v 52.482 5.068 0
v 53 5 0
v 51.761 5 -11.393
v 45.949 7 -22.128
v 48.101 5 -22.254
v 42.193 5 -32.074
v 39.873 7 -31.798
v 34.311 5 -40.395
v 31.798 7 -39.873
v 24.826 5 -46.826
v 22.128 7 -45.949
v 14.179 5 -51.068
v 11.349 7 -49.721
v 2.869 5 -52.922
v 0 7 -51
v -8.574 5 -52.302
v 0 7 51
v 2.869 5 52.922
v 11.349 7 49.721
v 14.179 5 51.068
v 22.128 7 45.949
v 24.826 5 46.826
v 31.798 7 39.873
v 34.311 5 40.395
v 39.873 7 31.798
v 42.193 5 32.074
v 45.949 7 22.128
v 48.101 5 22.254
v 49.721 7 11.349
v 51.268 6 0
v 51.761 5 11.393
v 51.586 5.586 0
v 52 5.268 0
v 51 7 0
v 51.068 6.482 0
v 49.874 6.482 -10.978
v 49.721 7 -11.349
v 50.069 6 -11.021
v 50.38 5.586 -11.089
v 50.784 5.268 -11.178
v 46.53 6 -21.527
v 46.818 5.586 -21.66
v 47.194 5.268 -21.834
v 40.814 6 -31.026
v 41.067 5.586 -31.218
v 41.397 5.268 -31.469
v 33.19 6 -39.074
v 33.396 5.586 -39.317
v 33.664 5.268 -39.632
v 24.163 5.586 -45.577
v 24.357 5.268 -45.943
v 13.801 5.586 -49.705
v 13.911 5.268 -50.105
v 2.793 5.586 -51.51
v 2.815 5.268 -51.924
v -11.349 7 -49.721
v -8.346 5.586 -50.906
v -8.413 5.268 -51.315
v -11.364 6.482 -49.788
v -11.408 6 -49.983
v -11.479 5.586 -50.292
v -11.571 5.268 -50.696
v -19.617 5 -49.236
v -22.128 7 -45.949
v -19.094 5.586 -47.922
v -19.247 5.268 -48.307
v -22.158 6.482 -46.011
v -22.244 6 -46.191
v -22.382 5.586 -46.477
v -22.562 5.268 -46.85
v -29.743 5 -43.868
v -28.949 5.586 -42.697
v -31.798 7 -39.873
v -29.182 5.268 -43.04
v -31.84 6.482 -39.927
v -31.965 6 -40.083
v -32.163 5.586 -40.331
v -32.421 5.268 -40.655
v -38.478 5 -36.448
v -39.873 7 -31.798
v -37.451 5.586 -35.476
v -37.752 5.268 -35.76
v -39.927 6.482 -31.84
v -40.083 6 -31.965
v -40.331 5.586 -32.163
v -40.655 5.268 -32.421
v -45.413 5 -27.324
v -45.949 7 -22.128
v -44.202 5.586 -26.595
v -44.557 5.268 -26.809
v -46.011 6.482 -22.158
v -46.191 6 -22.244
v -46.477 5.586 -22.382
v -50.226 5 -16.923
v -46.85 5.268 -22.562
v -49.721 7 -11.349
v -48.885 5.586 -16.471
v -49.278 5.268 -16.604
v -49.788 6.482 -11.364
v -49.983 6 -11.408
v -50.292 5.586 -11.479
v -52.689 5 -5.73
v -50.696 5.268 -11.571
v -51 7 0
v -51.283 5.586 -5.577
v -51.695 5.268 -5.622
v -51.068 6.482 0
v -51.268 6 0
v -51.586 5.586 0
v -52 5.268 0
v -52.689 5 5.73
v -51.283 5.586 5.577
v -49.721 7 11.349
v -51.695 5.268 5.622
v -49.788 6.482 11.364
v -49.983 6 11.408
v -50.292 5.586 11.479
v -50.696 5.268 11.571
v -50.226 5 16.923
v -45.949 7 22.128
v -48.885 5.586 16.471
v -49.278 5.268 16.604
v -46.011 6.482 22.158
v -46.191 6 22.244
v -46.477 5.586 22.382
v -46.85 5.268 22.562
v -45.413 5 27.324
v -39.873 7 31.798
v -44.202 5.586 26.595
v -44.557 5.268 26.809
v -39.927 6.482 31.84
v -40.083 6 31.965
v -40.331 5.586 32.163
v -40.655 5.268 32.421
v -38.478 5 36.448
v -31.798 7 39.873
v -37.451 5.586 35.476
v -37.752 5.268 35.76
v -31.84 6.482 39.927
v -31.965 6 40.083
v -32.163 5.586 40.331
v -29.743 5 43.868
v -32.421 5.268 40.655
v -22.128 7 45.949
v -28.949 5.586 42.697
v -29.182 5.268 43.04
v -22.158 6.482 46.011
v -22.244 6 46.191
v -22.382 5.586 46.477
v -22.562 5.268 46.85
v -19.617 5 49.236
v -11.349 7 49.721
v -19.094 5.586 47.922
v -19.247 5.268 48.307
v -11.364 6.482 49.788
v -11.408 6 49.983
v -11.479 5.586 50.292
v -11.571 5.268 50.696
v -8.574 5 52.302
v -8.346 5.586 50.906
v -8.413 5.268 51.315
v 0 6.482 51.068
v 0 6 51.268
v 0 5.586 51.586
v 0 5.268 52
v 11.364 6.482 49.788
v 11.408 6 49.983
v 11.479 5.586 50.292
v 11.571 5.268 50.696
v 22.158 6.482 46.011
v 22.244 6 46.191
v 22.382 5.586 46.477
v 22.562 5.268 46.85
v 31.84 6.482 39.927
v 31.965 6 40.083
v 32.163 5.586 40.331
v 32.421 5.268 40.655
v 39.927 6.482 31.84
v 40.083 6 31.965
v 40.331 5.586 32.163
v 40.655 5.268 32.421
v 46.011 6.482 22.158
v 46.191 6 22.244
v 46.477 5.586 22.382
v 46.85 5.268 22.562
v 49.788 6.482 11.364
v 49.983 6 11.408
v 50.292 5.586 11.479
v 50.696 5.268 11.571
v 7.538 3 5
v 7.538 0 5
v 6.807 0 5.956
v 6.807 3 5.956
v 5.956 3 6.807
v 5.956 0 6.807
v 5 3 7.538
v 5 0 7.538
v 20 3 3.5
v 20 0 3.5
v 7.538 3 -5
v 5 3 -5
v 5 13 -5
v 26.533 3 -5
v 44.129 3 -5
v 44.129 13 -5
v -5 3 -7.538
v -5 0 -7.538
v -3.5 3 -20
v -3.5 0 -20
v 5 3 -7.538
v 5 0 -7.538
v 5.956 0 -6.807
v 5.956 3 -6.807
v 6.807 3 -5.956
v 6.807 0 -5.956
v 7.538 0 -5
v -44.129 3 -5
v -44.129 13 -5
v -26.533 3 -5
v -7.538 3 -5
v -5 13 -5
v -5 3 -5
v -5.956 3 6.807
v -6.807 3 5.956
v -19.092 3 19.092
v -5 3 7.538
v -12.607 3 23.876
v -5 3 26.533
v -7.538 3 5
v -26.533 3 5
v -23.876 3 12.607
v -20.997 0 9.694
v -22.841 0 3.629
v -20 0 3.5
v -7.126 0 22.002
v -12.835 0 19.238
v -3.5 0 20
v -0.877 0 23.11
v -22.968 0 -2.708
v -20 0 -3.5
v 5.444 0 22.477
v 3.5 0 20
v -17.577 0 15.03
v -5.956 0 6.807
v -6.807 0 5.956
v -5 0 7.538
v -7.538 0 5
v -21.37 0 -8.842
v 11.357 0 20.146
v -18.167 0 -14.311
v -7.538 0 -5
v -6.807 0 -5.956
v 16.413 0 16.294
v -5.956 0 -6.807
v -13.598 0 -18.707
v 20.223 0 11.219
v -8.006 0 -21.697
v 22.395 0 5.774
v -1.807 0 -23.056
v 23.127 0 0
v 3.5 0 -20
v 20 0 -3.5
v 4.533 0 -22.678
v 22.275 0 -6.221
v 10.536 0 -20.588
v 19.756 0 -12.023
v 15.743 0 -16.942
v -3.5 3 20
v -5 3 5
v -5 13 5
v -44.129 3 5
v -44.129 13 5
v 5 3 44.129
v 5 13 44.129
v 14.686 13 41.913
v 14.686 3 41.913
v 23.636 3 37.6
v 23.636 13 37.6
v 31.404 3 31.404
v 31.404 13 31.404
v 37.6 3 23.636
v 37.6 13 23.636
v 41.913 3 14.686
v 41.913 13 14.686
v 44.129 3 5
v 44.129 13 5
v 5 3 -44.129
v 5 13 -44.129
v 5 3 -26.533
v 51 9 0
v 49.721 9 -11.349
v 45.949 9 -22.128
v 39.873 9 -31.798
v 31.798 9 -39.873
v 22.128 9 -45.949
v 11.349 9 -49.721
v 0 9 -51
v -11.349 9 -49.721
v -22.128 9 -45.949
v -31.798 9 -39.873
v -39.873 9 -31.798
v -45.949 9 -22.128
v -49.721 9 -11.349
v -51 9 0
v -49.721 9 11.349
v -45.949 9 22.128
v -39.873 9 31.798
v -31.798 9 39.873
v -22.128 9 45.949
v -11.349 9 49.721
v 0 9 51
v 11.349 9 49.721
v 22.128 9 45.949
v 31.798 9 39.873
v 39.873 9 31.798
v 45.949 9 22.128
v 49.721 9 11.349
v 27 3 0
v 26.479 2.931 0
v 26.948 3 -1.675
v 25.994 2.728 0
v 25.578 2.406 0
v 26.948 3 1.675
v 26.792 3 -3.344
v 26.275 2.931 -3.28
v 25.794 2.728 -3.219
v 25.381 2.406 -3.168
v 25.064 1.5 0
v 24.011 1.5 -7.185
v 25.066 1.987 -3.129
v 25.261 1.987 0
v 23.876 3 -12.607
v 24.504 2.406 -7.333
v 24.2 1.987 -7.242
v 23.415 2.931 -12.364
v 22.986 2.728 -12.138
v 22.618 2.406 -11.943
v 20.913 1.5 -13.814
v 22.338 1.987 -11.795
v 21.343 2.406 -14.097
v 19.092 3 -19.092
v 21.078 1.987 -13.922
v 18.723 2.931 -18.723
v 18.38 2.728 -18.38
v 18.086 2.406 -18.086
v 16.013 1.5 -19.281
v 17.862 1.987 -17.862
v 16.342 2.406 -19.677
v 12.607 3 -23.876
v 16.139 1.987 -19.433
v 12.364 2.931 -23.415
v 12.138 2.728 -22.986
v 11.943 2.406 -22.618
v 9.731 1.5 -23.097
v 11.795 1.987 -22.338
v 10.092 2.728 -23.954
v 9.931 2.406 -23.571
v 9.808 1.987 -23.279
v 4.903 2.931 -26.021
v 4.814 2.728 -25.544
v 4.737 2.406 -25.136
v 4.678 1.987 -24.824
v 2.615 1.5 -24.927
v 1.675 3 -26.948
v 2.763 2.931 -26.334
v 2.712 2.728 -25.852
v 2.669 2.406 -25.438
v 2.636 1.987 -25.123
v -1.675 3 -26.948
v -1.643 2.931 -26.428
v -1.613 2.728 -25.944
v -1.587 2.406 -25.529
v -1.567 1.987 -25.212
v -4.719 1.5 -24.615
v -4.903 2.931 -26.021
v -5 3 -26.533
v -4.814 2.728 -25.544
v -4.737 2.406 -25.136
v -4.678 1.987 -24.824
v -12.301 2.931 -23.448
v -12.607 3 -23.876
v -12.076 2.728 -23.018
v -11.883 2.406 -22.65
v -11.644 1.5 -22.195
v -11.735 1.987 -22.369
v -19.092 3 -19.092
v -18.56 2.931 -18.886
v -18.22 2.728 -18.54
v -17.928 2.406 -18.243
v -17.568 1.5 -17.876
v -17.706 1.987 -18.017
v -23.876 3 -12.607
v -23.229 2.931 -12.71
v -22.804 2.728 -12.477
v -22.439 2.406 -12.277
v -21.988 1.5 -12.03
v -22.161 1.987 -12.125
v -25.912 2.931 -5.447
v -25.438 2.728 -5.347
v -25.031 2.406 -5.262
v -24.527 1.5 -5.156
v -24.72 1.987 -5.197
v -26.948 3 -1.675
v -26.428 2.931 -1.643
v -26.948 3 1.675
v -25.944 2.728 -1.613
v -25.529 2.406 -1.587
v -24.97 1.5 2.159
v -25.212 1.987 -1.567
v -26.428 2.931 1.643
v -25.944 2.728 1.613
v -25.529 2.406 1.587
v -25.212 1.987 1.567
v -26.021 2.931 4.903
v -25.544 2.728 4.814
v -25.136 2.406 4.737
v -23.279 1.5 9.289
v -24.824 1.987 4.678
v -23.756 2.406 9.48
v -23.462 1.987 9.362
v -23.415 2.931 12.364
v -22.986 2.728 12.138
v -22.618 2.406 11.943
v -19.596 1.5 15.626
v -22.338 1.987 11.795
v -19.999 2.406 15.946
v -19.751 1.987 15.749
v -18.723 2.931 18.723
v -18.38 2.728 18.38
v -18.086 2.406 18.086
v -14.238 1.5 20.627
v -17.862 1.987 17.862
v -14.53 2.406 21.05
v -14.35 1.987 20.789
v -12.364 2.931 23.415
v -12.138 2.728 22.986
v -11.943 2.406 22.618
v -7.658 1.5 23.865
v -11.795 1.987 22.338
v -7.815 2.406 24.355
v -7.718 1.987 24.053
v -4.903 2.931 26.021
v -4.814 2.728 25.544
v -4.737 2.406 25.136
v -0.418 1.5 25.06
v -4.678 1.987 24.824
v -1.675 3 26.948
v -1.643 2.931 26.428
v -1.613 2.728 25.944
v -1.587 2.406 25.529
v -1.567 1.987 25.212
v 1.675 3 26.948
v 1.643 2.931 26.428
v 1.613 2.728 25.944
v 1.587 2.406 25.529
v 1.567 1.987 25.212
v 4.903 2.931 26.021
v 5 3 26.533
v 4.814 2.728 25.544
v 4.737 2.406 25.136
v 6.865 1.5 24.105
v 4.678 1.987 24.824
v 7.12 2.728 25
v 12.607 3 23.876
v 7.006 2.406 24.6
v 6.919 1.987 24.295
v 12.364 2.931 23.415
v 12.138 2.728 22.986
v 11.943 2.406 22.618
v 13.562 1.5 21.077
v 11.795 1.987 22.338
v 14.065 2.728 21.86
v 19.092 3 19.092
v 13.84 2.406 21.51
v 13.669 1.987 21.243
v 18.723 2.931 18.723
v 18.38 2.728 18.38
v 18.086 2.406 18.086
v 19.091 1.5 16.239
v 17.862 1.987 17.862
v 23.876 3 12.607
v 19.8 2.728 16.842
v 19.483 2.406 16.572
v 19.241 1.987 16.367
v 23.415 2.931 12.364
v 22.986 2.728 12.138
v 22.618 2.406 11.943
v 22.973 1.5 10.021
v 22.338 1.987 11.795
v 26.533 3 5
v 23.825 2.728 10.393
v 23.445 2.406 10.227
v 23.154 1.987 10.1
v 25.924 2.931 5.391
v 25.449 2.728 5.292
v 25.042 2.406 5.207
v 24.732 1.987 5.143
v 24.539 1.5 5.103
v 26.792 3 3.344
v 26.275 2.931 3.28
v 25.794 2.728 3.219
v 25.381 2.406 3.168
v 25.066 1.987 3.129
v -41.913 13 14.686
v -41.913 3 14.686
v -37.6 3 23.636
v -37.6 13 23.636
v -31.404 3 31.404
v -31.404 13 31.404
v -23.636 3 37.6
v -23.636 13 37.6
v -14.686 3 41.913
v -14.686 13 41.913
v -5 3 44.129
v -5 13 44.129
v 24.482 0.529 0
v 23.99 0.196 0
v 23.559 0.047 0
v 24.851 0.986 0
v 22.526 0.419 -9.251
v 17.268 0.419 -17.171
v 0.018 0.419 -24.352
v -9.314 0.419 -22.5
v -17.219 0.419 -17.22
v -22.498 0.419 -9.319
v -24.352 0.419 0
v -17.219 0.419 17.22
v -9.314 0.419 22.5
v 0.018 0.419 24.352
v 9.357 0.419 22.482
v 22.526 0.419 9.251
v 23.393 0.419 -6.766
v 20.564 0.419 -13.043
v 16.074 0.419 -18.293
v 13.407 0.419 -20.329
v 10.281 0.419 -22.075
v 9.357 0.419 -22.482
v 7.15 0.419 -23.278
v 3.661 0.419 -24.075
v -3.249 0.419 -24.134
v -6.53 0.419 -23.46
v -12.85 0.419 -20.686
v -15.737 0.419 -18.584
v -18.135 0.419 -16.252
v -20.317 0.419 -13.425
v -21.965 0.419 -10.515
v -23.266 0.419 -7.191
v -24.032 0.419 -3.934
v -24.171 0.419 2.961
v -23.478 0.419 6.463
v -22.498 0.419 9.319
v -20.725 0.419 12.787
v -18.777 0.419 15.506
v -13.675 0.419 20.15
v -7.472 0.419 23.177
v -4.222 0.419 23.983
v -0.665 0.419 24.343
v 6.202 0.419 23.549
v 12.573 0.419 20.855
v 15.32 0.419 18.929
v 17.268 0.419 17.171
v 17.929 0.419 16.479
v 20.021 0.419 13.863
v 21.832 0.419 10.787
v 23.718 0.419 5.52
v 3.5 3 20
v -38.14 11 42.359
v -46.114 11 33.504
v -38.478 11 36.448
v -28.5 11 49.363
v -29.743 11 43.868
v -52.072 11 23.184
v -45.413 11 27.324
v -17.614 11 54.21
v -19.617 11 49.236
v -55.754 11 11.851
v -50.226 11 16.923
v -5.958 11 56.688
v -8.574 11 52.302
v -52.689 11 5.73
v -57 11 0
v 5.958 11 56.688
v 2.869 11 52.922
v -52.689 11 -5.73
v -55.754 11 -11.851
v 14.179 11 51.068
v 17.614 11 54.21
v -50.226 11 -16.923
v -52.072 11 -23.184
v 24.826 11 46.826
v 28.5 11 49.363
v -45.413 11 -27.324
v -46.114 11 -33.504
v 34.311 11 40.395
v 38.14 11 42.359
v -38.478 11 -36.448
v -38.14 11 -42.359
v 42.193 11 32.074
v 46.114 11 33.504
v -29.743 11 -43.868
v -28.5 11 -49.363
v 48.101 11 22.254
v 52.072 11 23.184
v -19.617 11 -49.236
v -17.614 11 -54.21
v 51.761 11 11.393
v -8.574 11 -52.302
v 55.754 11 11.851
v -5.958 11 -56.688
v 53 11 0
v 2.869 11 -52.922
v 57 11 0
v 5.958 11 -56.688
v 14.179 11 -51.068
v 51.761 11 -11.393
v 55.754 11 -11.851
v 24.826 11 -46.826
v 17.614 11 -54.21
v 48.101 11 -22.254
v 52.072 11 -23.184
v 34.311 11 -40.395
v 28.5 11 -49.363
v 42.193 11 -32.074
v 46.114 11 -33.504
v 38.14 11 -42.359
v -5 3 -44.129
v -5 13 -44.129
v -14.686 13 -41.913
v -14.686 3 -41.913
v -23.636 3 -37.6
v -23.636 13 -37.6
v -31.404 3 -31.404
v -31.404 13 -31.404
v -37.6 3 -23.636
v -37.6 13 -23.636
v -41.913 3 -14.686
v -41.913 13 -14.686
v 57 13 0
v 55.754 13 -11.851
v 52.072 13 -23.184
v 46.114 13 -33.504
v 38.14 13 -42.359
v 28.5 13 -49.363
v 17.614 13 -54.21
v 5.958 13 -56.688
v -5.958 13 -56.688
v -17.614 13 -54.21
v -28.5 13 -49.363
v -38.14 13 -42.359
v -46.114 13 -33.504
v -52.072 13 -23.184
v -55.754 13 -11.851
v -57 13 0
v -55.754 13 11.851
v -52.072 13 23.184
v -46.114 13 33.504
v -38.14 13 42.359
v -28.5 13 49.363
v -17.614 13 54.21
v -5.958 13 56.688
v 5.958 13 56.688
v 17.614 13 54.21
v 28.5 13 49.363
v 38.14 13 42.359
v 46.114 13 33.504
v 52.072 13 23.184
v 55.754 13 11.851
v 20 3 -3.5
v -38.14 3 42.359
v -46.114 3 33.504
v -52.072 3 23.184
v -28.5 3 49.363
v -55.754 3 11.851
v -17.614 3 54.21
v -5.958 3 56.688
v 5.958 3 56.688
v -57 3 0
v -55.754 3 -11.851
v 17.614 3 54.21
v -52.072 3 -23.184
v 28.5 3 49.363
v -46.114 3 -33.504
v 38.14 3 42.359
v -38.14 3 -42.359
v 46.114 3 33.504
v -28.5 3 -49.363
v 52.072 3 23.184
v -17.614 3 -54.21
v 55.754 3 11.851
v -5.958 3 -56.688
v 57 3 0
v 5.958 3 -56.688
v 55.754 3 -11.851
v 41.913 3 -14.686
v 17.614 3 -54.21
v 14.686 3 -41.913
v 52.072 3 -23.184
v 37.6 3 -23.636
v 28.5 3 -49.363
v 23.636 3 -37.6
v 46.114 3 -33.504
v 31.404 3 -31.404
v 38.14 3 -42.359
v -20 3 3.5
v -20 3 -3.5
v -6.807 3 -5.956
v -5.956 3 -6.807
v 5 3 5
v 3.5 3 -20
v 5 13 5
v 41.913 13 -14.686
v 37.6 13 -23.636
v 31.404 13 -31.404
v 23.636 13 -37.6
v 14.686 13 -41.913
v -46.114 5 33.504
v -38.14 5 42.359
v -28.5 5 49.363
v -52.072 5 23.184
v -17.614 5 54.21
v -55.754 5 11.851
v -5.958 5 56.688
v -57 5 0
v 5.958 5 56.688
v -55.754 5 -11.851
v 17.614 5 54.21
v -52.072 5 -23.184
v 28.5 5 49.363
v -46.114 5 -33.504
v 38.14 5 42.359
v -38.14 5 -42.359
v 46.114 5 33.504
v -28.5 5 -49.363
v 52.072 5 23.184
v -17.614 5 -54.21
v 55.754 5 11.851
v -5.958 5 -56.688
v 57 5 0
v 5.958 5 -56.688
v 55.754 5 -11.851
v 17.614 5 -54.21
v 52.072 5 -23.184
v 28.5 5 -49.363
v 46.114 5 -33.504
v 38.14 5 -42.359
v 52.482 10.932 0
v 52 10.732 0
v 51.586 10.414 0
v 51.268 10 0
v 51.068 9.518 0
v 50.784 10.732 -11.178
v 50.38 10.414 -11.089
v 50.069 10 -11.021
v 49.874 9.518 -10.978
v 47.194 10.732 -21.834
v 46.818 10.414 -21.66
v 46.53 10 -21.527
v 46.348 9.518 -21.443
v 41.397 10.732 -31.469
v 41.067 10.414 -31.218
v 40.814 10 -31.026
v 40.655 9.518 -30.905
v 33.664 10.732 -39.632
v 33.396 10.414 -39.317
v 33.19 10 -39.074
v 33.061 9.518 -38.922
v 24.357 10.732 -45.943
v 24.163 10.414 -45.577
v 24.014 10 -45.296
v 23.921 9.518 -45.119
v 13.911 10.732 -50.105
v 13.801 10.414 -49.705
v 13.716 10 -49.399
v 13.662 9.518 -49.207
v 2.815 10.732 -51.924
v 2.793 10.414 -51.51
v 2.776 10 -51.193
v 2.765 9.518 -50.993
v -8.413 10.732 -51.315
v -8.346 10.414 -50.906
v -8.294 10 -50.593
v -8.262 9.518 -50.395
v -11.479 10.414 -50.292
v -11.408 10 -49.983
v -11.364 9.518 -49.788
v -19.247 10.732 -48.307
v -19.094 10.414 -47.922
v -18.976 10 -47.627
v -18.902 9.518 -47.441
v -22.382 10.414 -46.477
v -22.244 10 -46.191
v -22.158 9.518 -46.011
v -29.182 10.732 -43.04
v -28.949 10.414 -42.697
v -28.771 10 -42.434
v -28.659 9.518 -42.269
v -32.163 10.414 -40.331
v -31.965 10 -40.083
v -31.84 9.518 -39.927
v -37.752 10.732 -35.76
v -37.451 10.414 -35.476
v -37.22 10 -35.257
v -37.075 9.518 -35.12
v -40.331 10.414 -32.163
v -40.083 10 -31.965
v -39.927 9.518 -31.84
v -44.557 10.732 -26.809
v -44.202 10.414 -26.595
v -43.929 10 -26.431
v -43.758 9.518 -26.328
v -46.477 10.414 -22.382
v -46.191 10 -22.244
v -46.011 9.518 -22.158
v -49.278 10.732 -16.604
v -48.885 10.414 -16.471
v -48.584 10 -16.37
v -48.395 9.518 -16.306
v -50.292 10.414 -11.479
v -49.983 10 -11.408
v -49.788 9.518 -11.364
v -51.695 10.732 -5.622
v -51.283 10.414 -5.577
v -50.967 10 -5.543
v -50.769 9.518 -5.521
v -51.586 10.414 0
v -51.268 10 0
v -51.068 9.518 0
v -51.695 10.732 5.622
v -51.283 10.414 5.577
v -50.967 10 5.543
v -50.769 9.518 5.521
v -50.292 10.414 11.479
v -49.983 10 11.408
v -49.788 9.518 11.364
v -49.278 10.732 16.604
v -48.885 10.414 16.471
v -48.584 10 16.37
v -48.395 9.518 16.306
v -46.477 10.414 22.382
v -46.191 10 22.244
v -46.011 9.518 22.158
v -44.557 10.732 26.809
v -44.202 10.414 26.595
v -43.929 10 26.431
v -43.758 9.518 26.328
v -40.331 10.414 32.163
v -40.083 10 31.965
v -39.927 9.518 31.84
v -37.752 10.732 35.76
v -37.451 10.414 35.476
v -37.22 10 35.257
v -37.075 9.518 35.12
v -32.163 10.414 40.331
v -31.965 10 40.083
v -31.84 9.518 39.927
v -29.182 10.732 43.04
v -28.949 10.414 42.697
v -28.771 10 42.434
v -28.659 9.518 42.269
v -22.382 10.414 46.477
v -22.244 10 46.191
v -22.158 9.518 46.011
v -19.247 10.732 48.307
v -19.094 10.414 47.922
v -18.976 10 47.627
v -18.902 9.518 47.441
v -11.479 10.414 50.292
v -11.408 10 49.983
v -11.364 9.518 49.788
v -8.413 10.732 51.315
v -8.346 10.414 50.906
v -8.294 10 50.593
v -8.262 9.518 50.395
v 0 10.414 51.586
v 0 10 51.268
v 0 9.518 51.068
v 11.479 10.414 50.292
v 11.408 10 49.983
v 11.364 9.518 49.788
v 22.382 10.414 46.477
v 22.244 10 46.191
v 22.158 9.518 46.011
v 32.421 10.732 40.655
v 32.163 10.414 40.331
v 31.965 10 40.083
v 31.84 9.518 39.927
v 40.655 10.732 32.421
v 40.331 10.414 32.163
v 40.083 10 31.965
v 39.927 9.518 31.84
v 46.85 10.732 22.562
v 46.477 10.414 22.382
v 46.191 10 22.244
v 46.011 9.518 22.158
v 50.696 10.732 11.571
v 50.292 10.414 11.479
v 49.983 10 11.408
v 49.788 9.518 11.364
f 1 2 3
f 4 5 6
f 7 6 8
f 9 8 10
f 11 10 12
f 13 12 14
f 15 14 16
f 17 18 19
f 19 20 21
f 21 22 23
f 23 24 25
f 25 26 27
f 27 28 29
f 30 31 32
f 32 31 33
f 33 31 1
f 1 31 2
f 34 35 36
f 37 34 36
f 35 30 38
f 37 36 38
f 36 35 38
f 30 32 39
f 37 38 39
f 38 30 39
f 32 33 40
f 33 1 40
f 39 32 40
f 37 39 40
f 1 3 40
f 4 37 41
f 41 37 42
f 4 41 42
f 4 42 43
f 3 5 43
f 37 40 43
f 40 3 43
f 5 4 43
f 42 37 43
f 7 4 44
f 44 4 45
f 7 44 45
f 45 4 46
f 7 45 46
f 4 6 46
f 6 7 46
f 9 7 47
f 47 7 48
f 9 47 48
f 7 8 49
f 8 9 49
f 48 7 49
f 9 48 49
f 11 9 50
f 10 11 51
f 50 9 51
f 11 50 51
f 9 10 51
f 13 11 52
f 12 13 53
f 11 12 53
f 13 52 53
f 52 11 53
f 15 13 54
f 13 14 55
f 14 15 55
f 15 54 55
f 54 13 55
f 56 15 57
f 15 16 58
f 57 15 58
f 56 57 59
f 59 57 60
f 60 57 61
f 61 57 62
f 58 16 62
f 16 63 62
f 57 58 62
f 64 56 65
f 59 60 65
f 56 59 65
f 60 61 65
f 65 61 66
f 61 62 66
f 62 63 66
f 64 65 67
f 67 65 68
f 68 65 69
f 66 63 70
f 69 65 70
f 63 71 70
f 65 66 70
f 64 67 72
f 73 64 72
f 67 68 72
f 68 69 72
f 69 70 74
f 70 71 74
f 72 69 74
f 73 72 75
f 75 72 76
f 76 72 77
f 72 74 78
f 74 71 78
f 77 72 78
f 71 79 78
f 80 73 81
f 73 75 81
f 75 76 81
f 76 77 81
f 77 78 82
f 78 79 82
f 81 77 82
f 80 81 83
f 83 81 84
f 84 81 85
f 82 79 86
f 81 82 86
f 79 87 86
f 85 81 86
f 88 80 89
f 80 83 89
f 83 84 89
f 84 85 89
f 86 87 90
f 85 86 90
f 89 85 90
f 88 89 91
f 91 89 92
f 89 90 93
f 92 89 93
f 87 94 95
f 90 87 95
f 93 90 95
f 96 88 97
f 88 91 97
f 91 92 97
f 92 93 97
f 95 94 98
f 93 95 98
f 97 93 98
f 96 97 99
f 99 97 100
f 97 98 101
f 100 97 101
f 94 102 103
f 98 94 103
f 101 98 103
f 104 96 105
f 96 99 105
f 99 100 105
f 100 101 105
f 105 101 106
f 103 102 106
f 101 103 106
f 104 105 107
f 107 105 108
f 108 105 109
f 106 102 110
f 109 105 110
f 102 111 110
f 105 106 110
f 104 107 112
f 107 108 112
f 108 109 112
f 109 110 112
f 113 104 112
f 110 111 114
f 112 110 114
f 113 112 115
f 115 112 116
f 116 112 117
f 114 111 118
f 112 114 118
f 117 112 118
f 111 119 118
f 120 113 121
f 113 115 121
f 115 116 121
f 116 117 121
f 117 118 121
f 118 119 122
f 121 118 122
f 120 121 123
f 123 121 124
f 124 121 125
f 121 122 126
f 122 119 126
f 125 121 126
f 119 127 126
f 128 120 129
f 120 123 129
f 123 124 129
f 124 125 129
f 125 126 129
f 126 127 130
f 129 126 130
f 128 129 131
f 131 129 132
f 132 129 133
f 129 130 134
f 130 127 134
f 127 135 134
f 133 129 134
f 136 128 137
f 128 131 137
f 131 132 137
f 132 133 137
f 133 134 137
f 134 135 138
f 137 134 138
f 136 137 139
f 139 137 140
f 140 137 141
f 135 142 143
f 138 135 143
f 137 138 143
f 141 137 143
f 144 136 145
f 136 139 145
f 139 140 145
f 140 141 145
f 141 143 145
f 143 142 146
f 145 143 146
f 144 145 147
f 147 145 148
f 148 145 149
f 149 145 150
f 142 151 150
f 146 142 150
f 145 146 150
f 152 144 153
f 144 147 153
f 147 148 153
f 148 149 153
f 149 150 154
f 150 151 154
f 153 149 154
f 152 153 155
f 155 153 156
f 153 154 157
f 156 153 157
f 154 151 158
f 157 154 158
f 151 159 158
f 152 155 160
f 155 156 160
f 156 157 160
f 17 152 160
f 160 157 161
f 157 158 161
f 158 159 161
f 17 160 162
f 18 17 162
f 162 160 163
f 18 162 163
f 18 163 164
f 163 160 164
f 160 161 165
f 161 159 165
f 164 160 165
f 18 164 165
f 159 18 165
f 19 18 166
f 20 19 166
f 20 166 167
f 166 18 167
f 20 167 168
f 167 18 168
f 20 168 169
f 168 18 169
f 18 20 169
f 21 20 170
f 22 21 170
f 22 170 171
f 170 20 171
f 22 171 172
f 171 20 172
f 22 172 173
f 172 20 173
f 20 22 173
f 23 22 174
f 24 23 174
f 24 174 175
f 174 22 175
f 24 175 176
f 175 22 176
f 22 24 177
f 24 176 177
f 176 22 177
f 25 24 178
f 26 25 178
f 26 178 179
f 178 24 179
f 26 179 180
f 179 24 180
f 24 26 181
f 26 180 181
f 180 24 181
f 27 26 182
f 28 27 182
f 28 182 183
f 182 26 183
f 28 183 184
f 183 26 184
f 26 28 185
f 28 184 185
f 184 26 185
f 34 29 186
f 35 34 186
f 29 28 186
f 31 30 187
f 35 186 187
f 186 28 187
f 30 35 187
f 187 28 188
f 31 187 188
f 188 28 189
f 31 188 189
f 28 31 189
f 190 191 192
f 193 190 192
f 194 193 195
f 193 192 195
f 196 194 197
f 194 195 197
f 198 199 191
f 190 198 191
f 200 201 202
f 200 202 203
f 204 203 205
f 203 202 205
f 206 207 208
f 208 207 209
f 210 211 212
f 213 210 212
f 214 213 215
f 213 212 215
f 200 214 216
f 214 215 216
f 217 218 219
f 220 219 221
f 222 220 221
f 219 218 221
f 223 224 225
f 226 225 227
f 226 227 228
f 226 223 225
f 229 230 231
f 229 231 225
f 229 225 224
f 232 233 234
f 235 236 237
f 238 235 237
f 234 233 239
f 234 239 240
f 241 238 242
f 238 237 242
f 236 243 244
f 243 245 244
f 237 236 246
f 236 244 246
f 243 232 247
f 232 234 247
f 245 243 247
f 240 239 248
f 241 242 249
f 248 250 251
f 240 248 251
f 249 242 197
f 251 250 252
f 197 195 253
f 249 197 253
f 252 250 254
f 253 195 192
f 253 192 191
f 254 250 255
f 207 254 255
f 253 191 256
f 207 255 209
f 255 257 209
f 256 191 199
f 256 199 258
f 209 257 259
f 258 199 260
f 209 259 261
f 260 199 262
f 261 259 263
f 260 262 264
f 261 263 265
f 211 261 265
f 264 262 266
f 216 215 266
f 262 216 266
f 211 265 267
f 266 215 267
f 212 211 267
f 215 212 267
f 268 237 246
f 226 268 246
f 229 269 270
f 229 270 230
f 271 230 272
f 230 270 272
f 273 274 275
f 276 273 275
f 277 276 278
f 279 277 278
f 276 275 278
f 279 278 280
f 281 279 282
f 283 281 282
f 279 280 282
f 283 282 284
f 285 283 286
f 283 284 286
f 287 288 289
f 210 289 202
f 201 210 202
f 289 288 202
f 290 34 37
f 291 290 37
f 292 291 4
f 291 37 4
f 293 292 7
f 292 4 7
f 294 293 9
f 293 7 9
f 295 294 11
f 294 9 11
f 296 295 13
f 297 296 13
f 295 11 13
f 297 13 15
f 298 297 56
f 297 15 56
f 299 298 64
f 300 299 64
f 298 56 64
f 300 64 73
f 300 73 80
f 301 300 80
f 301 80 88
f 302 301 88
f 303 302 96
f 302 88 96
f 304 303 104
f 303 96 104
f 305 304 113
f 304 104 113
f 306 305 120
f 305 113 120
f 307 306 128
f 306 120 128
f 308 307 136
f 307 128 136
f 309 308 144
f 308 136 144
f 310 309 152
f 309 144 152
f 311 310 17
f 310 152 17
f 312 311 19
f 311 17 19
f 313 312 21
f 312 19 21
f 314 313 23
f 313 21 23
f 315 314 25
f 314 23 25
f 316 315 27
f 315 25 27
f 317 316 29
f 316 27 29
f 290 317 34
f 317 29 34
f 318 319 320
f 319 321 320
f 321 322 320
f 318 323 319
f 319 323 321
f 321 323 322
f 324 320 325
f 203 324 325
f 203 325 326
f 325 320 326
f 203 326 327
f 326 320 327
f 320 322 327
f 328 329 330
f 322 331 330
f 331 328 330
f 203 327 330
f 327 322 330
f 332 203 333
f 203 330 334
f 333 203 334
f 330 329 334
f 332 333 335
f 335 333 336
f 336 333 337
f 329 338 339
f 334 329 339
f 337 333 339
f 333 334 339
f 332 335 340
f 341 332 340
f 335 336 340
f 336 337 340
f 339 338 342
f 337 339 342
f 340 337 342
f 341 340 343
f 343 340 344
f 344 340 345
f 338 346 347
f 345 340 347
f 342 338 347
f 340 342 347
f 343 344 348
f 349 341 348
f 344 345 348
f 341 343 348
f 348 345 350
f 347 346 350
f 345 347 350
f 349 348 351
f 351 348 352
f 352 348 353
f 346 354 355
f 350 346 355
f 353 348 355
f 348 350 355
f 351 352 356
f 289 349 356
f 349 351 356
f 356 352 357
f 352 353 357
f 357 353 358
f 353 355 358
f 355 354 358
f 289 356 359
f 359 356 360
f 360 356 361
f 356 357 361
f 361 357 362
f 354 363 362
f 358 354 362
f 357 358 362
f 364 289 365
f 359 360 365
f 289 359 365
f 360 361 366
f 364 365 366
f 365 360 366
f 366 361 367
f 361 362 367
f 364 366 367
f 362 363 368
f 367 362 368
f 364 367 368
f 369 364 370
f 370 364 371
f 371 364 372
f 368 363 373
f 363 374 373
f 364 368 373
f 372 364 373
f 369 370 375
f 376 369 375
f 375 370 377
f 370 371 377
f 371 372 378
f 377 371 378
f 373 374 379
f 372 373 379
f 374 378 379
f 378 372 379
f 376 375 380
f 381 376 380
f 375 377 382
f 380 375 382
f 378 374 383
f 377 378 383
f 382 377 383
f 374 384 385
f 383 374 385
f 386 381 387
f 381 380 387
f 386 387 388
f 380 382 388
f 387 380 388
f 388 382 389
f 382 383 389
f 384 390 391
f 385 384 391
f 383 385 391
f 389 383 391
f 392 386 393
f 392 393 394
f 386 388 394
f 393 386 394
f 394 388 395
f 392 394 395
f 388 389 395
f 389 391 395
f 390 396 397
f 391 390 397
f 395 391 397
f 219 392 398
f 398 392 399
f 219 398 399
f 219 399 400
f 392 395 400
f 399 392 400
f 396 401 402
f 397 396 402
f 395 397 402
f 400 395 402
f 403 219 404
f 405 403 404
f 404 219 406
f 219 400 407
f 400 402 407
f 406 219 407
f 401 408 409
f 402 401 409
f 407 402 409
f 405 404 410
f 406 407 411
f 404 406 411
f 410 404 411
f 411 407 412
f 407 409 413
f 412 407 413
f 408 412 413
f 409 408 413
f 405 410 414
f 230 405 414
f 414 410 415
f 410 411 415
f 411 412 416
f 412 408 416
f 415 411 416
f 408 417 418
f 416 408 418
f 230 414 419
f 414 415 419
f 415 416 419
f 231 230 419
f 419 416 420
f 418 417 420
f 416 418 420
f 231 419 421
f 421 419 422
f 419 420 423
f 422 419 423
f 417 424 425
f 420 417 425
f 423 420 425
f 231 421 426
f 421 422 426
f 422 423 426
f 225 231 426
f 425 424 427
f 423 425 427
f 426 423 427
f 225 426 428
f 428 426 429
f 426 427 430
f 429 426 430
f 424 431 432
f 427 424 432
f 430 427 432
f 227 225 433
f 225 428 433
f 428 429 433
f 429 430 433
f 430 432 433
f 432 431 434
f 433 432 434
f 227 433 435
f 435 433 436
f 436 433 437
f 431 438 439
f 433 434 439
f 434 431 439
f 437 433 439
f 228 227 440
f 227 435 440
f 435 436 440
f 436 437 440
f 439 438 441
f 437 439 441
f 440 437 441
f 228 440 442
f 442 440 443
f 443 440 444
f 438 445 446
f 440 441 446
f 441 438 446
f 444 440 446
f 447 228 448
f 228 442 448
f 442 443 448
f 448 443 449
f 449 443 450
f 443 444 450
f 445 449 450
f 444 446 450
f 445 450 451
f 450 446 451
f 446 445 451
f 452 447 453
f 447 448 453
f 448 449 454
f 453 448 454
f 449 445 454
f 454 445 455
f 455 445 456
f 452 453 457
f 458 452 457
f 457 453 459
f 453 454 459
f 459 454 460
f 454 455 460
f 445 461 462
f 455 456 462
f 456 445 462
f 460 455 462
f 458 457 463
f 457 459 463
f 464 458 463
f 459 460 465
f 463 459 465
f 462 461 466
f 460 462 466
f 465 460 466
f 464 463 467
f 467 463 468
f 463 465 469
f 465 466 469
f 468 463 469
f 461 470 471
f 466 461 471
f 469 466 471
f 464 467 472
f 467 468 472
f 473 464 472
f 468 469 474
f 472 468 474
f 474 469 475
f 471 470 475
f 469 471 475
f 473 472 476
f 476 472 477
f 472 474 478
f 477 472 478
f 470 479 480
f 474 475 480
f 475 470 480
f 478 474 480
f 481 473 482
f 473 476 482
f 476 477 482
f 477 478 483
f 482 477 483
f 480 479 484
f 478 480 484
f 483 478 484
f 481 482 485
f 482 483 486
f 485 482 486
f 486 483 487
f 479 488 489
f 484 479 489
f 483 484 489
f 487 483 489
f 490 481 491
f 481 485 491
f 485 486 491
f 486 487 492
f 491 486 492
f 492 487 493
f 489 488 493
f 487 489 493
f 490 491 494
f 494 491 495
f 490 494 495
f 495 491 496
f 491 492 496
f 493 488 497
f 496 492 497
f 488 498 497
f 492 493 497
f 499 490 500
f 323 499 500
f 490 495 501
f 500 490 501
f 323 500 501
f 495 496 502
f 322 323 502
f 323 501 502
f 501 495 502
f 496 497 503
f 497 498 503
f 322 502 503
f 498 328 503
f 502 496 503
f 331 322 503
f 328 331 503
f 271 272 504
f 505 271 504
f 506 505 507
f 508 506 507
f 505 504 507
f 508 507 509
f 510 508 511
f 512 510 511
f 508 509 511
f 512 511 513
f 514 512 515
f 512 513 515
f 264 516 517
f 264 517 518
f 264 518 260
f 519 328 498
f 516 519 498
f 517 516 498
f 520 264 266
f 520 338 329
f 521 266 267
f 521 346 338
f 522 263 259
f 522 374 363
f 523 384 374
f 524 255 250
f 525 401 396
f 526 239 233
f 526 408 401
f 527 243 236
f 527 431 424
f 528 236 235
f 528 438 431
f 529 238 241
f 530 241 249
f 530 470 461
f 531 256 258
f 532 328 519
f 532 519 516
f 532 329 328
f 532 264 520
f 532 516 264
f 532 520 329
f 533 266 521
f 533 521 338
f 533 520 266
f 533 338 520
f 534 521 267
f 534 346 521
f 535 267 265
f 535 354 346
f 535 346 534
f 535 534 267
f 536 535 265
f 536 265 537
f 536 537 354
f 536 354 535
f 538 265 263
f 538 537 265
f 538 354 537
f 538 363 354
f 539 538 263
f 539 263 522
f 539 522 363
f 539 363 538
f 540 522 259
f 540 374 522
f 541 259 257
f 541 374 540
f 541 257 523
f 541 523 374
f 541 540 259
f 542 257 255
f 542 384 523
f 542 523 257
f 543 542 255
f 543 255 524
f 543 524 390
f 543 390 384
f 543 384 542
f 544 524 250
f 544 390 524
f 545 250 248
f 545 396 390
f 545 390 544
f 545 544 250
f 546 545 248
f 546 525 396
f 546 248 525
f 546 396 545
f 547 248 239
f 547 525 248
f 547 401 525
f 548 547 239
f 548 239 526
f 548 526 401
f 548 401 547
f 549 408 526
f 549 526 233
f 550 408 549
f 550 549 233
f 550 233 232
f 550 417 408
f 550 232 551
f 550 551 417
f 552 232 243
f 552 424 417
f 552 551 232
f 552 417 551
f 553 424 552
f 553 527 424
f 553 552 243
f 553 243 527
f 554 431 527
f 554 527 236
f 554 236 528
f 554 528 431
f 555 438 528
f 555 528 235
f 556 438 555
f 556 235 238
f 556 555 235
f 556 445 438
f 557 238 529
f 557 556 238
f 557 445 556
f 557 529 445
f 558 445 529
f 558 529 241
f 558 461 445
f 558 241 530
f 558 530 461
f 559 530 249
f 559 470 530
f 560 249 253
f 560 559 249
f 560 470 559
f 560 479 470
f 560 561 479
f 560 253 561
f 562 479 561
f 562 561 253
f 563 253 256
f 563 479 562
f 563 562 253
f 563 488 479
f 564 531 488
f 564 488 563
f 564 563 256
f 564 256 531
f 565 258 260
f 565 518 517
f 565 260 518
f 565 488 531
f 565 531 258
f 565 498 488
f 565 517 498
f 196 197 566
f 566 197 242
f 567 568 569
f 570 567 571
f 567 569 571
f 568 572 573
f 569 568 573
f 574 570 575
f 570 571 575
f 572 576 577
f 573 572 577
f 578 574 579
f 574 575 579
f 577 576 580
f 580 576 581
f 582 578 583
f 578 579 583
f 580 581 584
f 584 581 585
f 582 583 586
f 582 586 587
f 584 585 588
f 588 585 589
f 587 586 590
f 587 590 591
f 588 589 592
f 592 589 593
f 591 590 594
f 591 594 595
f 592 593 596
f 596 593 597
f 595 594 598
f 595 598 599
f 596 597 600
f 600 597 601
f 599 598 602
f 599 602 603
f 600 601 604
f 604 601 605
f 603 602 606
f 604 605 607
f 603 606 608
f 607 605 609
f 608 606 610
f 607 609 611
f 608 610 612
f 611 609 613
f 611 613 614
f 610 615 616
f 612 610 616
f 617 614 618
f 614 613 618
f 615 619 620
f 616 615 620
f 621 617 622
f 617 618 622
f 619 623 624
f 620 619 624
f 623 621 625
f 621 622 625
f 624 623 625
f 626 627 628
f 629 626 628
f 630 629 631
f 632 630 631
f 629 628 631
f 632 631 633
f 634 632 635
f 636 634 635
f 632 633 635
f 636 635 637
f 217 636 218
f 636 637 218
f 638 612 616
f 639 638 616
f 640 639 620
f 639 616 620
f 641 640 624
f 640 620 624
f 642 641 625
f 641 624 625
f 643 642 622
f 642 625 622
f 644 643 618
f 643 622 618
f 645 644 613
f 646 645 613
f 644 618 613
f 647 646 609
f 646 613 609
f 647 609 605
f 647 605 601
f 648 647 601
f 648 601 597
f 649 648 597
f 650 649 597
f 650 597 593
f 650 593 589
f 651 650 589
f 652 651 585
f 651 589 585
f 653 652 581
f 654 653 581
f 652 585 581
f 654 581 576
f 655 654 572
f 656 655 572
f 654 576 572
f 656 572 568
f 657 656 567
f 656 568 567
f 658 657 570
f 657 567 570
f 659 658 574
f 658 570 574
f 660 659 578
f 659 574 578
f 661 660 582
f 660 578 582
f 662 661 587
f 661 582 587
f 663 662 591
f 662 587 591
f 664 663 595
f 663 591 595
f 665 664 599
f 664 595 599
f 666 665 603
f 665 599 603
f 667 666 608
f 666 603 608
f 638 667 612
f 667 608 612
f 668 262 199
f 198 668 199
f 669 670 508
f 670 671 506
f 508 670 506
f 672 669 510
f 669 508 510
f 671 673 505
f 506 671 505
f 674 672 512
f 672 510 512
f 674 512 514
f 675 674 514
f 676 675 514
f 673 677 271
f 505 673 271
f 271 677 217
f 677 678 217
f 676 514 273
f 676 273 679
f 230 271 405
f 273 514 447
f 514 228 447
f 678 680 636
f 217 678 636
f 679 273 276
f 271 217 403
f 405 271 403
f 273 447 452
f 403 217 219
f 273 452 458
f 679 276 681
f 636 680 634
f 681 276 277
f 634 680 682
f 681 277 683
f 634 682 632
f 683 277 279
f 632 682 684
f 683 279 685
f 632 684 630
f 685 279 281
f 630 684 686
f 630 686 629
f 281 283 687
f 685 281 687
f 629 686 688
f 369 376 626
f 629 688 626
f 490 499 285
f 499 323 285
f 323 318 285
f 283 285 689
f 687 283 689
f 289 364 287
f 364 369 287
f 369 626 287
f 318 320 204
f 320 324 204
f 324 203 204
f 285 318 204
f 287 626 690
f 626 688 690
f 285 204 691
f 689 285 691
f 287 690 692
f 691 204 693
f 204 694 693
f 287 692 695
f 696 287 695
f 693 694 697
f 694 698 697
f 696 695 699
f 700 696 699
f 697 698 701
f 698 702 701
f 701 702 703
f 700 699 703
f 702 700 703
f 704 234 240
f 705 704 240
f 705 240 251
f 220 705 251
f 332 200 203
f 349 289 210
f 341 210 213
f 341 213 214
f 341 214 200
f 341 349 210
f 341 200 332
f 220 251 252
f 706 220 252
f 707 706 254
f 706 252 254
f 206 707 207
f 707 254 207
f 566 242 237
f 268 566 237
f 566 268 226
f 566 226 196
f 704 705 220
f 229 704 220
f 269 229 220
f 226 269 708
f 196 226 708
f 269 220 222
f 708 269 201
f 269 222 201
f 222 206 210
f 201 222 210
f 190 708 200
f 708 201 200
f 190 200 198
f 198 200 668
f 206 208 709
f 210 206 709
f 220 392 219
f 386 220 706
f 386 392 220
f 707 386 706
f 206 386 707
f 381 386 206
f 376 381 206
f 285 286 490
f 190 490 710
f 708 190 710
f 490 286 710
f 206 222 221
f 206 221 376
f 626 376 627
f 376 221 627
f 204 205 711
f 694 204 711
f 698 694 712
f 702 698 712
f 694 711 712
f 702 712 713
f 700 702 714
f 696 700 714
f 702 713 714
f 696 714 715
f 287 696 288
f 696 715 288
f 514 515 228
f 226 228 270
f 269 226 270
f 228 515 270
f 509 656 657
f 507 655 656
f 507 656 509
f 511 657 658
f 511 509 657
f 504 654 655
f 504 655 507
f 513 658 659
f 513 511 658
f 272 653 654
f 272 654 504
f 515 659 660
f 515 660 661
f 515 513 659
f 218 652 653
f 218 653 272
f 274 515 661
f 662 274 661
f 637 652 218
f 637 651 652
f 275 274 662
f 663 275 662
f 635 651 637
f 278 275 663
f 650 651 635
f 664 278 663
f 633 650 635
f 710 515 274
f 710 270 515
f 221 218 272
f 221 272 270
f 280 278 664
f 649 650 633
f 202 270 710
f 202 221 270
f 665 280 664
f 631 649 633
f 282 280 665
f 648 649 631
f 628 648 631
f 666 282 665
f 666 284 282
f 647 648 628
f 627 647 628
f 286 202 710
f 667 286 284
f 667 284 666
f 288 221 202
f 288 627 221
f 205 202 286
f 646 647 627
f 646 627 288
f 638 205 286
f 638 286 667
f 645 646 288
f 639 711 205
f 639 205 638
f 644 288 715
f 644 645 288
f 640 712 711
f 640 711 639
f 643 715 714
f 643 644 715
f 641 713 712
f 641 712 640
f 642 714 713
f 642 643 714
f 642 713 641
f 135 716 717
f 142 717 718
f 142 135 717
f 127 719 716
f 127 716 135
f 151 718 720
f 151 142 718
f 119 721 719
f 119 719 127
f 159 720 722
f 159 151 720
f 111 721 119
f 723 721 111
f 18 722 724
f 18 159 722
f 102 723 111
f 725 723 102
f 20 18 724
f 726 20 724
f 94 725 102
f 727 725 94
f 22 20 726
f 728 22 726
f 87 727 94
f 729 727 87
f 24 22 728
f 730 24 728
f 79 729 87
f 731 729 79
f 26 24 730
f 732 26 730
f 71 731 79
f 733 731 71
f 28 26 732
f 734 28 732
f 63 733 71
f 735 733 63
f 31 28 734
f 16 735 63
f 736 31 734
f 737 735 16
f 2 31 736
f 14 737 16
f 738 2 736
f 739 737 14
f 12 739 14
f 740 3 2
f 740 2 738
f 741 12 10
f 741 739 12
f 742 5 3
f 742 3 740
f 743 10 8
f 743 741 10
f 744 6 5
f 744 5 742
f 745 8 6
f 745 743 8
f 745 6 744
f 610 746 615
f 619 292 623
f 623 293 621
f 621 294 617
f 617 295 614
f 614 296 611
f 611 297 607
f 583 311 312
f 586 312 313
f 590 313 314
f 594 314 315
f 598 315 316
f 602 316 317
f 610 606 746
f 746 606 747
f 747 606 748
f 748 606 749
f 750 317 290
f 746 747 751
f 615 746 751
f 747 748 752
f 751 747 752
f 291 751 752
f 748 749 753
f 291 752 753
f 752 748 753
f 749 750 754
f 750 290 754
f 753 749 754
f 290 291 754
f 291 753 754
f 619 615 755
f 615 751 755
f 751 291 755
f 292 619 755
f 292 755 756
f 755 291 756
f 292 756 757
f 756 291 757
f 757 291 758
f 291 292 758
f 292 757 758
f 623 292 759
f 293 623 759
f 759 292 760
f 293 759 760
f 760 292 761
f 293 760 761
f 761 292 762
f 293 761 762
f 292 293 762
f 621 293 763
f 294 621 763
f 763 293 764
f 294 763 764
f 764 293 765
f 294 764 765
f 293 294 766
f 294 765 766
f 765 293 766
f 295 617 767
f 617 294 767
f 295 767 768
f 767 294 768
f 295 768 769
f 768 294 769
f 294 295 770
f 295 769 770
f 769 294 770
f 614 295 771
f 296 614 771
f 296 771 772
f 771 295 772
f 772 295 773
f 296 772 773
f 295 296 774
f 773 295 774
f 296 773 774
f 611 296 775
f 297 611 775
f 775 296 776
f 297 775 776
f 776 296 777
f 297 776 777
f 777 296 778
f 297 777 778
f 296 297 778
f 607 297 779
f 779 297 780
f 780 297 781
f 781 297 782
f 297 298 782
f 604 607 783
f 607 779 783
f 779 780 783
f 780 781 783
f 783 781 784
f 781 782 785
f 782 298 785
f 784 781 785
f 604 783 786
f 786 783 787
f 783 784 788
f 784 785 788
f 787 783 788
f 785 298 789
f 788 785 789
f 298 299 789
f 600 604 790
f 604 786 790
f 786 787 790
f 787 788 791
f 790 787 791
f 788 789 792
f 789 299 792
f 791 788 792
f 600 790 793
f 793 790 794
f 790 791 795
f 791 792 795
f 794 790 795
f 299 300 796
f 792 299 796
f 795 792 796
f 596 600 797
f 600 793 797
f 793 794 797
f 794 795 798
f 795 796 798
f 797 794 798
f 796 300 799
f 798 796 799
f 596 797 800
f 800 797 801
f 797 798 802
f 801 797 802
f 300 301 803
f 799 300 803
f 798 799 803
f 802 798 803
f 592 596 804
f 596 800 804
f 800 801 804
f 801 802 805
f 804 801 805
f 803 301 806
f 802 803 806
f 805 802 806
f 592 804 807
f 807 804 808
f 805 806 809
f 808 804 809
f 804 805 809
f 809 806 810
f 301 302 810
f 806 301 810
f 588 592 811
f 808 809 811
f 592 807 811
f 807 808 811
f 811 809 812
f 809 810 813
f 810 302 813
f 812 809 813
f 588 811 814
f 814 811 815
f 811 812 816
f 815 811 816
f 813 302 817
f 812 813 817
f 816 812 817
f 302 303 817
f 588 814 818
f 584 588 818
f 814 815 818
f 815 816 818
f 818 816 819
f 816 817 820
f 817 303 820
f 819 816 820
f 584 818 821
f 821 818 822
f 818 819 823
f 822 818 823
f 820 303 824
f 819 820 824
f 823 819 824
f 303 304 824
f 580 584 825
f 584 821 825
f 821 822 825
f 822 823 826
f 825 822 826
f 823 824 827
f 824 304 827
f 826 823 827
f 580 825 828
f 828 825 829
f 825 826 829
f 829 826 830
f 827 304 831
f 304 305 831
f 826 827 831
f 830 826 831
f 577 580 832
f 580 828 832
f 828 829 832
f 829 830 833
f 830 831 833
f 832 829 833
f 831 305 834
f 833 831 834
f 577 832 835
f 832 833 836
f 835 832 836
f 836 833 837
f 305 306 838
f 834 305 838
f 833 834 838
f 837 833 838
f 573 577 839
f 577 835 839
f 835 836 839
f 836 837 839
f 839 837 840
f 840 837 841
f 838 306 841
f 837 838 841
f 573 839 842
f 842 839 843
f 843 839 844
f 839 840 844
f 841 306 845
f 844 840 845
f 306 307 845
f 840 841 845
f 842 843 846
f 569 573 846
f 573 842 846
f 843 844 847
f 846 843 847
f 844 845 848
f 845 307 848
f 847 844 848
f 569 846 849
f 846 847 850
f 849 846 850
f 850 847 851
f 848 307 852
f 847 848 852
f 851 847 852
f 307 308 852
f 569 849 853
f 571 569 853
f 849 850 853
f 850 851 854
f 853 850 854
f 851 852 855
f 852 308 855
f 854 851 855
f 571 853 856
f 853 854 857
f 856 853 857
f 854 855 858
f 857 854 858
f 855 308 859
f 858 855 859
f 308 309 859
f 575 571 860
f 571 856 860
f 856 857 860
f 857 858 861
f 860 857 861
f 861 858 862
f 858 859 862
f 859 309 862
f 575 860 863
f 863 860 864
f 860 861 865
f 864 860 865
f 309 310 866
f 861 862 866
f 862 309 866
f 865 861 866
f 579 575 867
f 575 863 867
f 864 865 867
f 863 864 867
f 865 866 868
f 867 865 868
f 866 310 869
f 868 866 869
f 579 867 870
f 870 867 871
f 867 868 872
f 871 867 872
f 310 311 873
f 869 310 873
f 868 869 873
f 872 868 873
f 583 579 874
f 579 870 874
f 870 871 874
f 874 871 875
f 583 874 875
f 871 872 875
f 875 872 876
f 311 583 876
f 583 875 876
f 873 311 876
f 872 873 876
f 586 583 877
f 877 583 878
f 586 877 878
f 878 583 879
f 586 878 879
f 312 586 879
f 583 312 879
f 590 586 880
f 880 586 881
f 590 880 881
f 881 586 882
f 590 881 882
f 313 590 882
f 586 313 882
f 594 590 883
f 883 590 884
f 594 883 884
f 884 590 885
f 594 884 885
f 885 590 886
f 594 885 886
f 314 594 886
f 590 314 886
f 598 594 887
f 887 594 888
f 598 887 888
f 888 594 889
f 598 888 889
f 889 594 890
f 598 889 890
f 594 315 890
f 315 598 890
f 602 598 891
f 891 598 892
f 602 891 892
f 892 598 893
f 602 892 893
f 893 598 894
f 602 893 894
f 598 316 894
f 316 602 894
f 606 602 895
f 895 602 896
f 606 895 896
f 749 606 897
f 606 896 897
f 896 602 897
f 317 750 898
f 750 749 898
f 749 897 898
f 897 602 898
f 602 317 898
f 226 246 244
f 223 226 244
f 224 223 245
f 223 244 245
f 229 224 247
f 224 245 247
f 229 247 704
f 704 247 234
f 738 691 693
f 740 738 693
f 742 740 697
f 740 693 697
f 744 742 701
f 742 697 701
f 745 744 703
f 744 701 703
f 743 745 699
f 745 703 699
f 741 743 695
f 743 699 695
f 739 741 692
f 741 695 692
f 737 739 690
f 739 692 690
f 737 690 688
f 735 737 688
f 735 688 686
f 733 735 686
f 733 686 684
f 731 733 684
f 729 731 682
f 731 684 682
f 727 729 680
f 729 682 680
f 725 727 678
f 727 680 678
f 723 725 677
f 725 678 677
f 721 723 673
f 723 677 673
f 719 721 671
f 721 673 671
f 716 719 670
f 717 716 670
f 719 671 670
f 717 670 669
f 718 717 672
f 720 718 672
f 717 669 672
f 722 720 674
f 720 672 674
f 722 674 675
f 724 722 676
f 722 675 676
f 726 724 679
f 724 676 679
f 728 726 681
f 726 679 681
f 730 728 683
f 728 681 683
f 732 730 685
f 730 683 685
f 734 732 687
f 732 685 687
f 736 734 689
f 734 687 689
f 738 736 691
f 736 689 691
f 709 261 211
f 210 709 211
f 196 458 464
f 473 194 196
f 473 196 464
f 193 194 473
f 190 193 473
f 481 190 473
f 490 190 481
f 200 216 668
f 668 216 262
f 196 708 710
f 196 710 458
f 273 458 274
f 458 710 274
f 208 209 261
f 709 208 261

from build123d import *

# Parameters (mm, degrees)
SKETCH1_R            = 25
BOSS_EXTRUDE2_DEPTH  = 3
SKETCH3_R            = 57
BOSS_EXTRUDE10_DEPTH = 2
SKETCH8_R            = 51
SKETCH8_R_2          = 45
BOSS_EXTRUDE11_DEPTH = 6
SKETCH9_R            = 10
BOSS_EXTRUDE12_DEPTH = 6
SKETCH10_R           = 57
BOSS_EXTRUDE13_DEPTH = 2
FILLET1_R            = 2
FILLET2_R            = 2
FILLET3_R            = 2
FILLET4_R            = 2
SKETCH11_R           = 50
BOSS_EXTRUDE14_DEPTH = 10
CUT_EXTRUDE3_DEPTH   = 10


with BuildPart() as part:
    # Sketch1 → Boss-Extrude2 (new body)
    with BuildSketch(Plane(origin=(0, 0, 0), x_dir=(1, 0, 0), z_dir=(0, 1, 0))):
        Circle(SKETCH1_R)
        with BuildLine():
            Line((20, -3.5), (7.537849637, -5))
            ThreePointArc((7.537849637, -5), (6.396060395, -6.396060395), (5, -7.537849637))
            Line((5, -7.537849637), (3.5, -20))
            Line((3.5, -20), (-3.5, -20))
            Line((-3.5, -20), (-5, -7.537849637))
            ThreePointArc((-5, -7.537849637), (-6.396060395, -6.396060395), (-7.537849637, -5))
            Line((-7.537849637, -5), (-20, -3.5))
            Line((-20, -3.5), (-20, 3.5))
            Line((-20, 3.5), (-7.537849637, 5))
            ThreePointArc((-7.537849637, 5), (-6.396060395, 6.396060395), (-5, 7.537849637))
            Line((-5, 7.537849637), (-3.5, 20))
            Line((-3.5, 20), (3.5, 20))
            Line((3.5, 20), (5, 7.537849637))
            ThreePointArc((5, 7.537849637), (6.396060395, 6.396060395), (7.537849637, 5))
            Line((7.537849637, 5), (20, 3.5))
            Line((20, 3.5), (20, -3.5))
        make_face(mode=Mode.SUBTRACT)
    extrude(amount=BOSS_EXTRUDE2_DEPTH)

    # Sketch3 → Boss-Extrude10 (add)
    with BuildSketch(Plane(origin=(0, 3, 0), x_dir=(1, 0, 0), z_dir=(0, 1, 0))):
        Circle(SKETCH3_R)
    extrude(amount=BOSS_EXTRUDE10_DEPTH)

    # Sketch8 → Boss-Extrude11 (add)
    with BuildSketch(Plane(origin=(0, 5, 0), x_dir=(1, 0, 0), z_dir=(0, 1, 0))):
        Circle(SKETCH8_R)
        Circle(SKETCH8_R_2, mode=Mode.SUBTRACT)
    extrude(amount=BOSS_EXTRUDE11_DEPTH)

    # Sketch9 → Boss-Extrude12 (add)
    with BuildSketch(Plane(origin=(0, 5, 0), x_dir=(1, 0, 0), z_dir=(0, 1, 0))):
        Circle(SKETCH9_R)
    extrude(amount=BOSS_EXTRUDE12_DEPTH)

    # Sketch10 → Boss-Extrude13 (add)
    with BuildSketch(Plane(origin=(0, 11, 0), x_dir=(1, 0, 0), z_dir=(0, 1, 0))):
        Circle(SKETCH10_R)
    extrude(amount=BOSS_EXTRUDE13_DEPTH)

    # Fillet1
    fillet1_edges = [part.edges().sort_by_distance(p)[0] for p in [
        (-51, 11, 0),
    ]]
    fillet(fillet1_edges, radius=FILLET1_R)

    # Fillet2
    fillet2_edges = [part.edges().sort_by_distance(p)[0] for p in [
        (-51, 5, 0),
    ]]
    fillet(fillet2_edges, radius=FILLET2_R)

    # Fillet3
    fillet3_edges = [part.edges().sort_by_distance(p)[0] for p in [
        (-25, 3, 0),
    ]]
    fillet(fillet3_edges, radius=FILLET3_R)

    # Fillet4
    fillet4_edges = [part.edges().sort_by_distance(p)[0] for p in [
        (-25, 0, 0),
    ]]
    fillet(fillet4_edges, radius=FILLET4_R)

    # Sketch11 → Boss-Extrude14 (add)
    with BuildSketch(Plane(origin=(0, 13, 0), x_dir=(1, 0, 0), z_dir=(0, 1, 0))):
        Circle(SKETCH11_R)
    extrude(amount=-BOSS_EXTRUDE14_DEPTH)

    # Sketch12 → Cut-Extrude3 (cut)
    with BuildSketch(Plane(origin=(0, 13, 0), x_dir=(1, 0, 0), z_dir=(0, 1, 0))):
        with BuildLine():
            Line((44.129475009, -5), (5, -5))
            Line((5, -5), (5, -44.129475009))
            ThreePointArc((5, -44.129475009), (31.403905526, -31.403905526), (44.129475009, -5))
        make_face()
        with BuildLine():
            Line((5, 5), (44.129475009, 5))
            ThreePointArc((44.129475009, 5), (31.403905526, 31.403905526), (5, 44.129475009))
            Line((5, 44.129475009), (5, 5))
        make_face()
        with BuildLine():
            Line((-44.129475009, 5), (-5, 5))
            Line((-5, 5), (-5, 44.129475009))
            ThreePointArc((-5, 44.129475009), (-31.403905526, 31.403905526), (-44.129475009, 5))
        make_face()
        with BuildLine():
            Line((-5, -44.129475009), (-5, -5))
            Line((-5, -5), (-44.129475009, -5))
            ThreePointArc((-44.129475009, -5), (-31.403905526, -31.403905526), (-5, -44.129475009))
        make_face()
    extrude(amount=-CUT_EXTRUDE3_DEPTH, mode=Mode.SUBTRACT)


solid = part.part
